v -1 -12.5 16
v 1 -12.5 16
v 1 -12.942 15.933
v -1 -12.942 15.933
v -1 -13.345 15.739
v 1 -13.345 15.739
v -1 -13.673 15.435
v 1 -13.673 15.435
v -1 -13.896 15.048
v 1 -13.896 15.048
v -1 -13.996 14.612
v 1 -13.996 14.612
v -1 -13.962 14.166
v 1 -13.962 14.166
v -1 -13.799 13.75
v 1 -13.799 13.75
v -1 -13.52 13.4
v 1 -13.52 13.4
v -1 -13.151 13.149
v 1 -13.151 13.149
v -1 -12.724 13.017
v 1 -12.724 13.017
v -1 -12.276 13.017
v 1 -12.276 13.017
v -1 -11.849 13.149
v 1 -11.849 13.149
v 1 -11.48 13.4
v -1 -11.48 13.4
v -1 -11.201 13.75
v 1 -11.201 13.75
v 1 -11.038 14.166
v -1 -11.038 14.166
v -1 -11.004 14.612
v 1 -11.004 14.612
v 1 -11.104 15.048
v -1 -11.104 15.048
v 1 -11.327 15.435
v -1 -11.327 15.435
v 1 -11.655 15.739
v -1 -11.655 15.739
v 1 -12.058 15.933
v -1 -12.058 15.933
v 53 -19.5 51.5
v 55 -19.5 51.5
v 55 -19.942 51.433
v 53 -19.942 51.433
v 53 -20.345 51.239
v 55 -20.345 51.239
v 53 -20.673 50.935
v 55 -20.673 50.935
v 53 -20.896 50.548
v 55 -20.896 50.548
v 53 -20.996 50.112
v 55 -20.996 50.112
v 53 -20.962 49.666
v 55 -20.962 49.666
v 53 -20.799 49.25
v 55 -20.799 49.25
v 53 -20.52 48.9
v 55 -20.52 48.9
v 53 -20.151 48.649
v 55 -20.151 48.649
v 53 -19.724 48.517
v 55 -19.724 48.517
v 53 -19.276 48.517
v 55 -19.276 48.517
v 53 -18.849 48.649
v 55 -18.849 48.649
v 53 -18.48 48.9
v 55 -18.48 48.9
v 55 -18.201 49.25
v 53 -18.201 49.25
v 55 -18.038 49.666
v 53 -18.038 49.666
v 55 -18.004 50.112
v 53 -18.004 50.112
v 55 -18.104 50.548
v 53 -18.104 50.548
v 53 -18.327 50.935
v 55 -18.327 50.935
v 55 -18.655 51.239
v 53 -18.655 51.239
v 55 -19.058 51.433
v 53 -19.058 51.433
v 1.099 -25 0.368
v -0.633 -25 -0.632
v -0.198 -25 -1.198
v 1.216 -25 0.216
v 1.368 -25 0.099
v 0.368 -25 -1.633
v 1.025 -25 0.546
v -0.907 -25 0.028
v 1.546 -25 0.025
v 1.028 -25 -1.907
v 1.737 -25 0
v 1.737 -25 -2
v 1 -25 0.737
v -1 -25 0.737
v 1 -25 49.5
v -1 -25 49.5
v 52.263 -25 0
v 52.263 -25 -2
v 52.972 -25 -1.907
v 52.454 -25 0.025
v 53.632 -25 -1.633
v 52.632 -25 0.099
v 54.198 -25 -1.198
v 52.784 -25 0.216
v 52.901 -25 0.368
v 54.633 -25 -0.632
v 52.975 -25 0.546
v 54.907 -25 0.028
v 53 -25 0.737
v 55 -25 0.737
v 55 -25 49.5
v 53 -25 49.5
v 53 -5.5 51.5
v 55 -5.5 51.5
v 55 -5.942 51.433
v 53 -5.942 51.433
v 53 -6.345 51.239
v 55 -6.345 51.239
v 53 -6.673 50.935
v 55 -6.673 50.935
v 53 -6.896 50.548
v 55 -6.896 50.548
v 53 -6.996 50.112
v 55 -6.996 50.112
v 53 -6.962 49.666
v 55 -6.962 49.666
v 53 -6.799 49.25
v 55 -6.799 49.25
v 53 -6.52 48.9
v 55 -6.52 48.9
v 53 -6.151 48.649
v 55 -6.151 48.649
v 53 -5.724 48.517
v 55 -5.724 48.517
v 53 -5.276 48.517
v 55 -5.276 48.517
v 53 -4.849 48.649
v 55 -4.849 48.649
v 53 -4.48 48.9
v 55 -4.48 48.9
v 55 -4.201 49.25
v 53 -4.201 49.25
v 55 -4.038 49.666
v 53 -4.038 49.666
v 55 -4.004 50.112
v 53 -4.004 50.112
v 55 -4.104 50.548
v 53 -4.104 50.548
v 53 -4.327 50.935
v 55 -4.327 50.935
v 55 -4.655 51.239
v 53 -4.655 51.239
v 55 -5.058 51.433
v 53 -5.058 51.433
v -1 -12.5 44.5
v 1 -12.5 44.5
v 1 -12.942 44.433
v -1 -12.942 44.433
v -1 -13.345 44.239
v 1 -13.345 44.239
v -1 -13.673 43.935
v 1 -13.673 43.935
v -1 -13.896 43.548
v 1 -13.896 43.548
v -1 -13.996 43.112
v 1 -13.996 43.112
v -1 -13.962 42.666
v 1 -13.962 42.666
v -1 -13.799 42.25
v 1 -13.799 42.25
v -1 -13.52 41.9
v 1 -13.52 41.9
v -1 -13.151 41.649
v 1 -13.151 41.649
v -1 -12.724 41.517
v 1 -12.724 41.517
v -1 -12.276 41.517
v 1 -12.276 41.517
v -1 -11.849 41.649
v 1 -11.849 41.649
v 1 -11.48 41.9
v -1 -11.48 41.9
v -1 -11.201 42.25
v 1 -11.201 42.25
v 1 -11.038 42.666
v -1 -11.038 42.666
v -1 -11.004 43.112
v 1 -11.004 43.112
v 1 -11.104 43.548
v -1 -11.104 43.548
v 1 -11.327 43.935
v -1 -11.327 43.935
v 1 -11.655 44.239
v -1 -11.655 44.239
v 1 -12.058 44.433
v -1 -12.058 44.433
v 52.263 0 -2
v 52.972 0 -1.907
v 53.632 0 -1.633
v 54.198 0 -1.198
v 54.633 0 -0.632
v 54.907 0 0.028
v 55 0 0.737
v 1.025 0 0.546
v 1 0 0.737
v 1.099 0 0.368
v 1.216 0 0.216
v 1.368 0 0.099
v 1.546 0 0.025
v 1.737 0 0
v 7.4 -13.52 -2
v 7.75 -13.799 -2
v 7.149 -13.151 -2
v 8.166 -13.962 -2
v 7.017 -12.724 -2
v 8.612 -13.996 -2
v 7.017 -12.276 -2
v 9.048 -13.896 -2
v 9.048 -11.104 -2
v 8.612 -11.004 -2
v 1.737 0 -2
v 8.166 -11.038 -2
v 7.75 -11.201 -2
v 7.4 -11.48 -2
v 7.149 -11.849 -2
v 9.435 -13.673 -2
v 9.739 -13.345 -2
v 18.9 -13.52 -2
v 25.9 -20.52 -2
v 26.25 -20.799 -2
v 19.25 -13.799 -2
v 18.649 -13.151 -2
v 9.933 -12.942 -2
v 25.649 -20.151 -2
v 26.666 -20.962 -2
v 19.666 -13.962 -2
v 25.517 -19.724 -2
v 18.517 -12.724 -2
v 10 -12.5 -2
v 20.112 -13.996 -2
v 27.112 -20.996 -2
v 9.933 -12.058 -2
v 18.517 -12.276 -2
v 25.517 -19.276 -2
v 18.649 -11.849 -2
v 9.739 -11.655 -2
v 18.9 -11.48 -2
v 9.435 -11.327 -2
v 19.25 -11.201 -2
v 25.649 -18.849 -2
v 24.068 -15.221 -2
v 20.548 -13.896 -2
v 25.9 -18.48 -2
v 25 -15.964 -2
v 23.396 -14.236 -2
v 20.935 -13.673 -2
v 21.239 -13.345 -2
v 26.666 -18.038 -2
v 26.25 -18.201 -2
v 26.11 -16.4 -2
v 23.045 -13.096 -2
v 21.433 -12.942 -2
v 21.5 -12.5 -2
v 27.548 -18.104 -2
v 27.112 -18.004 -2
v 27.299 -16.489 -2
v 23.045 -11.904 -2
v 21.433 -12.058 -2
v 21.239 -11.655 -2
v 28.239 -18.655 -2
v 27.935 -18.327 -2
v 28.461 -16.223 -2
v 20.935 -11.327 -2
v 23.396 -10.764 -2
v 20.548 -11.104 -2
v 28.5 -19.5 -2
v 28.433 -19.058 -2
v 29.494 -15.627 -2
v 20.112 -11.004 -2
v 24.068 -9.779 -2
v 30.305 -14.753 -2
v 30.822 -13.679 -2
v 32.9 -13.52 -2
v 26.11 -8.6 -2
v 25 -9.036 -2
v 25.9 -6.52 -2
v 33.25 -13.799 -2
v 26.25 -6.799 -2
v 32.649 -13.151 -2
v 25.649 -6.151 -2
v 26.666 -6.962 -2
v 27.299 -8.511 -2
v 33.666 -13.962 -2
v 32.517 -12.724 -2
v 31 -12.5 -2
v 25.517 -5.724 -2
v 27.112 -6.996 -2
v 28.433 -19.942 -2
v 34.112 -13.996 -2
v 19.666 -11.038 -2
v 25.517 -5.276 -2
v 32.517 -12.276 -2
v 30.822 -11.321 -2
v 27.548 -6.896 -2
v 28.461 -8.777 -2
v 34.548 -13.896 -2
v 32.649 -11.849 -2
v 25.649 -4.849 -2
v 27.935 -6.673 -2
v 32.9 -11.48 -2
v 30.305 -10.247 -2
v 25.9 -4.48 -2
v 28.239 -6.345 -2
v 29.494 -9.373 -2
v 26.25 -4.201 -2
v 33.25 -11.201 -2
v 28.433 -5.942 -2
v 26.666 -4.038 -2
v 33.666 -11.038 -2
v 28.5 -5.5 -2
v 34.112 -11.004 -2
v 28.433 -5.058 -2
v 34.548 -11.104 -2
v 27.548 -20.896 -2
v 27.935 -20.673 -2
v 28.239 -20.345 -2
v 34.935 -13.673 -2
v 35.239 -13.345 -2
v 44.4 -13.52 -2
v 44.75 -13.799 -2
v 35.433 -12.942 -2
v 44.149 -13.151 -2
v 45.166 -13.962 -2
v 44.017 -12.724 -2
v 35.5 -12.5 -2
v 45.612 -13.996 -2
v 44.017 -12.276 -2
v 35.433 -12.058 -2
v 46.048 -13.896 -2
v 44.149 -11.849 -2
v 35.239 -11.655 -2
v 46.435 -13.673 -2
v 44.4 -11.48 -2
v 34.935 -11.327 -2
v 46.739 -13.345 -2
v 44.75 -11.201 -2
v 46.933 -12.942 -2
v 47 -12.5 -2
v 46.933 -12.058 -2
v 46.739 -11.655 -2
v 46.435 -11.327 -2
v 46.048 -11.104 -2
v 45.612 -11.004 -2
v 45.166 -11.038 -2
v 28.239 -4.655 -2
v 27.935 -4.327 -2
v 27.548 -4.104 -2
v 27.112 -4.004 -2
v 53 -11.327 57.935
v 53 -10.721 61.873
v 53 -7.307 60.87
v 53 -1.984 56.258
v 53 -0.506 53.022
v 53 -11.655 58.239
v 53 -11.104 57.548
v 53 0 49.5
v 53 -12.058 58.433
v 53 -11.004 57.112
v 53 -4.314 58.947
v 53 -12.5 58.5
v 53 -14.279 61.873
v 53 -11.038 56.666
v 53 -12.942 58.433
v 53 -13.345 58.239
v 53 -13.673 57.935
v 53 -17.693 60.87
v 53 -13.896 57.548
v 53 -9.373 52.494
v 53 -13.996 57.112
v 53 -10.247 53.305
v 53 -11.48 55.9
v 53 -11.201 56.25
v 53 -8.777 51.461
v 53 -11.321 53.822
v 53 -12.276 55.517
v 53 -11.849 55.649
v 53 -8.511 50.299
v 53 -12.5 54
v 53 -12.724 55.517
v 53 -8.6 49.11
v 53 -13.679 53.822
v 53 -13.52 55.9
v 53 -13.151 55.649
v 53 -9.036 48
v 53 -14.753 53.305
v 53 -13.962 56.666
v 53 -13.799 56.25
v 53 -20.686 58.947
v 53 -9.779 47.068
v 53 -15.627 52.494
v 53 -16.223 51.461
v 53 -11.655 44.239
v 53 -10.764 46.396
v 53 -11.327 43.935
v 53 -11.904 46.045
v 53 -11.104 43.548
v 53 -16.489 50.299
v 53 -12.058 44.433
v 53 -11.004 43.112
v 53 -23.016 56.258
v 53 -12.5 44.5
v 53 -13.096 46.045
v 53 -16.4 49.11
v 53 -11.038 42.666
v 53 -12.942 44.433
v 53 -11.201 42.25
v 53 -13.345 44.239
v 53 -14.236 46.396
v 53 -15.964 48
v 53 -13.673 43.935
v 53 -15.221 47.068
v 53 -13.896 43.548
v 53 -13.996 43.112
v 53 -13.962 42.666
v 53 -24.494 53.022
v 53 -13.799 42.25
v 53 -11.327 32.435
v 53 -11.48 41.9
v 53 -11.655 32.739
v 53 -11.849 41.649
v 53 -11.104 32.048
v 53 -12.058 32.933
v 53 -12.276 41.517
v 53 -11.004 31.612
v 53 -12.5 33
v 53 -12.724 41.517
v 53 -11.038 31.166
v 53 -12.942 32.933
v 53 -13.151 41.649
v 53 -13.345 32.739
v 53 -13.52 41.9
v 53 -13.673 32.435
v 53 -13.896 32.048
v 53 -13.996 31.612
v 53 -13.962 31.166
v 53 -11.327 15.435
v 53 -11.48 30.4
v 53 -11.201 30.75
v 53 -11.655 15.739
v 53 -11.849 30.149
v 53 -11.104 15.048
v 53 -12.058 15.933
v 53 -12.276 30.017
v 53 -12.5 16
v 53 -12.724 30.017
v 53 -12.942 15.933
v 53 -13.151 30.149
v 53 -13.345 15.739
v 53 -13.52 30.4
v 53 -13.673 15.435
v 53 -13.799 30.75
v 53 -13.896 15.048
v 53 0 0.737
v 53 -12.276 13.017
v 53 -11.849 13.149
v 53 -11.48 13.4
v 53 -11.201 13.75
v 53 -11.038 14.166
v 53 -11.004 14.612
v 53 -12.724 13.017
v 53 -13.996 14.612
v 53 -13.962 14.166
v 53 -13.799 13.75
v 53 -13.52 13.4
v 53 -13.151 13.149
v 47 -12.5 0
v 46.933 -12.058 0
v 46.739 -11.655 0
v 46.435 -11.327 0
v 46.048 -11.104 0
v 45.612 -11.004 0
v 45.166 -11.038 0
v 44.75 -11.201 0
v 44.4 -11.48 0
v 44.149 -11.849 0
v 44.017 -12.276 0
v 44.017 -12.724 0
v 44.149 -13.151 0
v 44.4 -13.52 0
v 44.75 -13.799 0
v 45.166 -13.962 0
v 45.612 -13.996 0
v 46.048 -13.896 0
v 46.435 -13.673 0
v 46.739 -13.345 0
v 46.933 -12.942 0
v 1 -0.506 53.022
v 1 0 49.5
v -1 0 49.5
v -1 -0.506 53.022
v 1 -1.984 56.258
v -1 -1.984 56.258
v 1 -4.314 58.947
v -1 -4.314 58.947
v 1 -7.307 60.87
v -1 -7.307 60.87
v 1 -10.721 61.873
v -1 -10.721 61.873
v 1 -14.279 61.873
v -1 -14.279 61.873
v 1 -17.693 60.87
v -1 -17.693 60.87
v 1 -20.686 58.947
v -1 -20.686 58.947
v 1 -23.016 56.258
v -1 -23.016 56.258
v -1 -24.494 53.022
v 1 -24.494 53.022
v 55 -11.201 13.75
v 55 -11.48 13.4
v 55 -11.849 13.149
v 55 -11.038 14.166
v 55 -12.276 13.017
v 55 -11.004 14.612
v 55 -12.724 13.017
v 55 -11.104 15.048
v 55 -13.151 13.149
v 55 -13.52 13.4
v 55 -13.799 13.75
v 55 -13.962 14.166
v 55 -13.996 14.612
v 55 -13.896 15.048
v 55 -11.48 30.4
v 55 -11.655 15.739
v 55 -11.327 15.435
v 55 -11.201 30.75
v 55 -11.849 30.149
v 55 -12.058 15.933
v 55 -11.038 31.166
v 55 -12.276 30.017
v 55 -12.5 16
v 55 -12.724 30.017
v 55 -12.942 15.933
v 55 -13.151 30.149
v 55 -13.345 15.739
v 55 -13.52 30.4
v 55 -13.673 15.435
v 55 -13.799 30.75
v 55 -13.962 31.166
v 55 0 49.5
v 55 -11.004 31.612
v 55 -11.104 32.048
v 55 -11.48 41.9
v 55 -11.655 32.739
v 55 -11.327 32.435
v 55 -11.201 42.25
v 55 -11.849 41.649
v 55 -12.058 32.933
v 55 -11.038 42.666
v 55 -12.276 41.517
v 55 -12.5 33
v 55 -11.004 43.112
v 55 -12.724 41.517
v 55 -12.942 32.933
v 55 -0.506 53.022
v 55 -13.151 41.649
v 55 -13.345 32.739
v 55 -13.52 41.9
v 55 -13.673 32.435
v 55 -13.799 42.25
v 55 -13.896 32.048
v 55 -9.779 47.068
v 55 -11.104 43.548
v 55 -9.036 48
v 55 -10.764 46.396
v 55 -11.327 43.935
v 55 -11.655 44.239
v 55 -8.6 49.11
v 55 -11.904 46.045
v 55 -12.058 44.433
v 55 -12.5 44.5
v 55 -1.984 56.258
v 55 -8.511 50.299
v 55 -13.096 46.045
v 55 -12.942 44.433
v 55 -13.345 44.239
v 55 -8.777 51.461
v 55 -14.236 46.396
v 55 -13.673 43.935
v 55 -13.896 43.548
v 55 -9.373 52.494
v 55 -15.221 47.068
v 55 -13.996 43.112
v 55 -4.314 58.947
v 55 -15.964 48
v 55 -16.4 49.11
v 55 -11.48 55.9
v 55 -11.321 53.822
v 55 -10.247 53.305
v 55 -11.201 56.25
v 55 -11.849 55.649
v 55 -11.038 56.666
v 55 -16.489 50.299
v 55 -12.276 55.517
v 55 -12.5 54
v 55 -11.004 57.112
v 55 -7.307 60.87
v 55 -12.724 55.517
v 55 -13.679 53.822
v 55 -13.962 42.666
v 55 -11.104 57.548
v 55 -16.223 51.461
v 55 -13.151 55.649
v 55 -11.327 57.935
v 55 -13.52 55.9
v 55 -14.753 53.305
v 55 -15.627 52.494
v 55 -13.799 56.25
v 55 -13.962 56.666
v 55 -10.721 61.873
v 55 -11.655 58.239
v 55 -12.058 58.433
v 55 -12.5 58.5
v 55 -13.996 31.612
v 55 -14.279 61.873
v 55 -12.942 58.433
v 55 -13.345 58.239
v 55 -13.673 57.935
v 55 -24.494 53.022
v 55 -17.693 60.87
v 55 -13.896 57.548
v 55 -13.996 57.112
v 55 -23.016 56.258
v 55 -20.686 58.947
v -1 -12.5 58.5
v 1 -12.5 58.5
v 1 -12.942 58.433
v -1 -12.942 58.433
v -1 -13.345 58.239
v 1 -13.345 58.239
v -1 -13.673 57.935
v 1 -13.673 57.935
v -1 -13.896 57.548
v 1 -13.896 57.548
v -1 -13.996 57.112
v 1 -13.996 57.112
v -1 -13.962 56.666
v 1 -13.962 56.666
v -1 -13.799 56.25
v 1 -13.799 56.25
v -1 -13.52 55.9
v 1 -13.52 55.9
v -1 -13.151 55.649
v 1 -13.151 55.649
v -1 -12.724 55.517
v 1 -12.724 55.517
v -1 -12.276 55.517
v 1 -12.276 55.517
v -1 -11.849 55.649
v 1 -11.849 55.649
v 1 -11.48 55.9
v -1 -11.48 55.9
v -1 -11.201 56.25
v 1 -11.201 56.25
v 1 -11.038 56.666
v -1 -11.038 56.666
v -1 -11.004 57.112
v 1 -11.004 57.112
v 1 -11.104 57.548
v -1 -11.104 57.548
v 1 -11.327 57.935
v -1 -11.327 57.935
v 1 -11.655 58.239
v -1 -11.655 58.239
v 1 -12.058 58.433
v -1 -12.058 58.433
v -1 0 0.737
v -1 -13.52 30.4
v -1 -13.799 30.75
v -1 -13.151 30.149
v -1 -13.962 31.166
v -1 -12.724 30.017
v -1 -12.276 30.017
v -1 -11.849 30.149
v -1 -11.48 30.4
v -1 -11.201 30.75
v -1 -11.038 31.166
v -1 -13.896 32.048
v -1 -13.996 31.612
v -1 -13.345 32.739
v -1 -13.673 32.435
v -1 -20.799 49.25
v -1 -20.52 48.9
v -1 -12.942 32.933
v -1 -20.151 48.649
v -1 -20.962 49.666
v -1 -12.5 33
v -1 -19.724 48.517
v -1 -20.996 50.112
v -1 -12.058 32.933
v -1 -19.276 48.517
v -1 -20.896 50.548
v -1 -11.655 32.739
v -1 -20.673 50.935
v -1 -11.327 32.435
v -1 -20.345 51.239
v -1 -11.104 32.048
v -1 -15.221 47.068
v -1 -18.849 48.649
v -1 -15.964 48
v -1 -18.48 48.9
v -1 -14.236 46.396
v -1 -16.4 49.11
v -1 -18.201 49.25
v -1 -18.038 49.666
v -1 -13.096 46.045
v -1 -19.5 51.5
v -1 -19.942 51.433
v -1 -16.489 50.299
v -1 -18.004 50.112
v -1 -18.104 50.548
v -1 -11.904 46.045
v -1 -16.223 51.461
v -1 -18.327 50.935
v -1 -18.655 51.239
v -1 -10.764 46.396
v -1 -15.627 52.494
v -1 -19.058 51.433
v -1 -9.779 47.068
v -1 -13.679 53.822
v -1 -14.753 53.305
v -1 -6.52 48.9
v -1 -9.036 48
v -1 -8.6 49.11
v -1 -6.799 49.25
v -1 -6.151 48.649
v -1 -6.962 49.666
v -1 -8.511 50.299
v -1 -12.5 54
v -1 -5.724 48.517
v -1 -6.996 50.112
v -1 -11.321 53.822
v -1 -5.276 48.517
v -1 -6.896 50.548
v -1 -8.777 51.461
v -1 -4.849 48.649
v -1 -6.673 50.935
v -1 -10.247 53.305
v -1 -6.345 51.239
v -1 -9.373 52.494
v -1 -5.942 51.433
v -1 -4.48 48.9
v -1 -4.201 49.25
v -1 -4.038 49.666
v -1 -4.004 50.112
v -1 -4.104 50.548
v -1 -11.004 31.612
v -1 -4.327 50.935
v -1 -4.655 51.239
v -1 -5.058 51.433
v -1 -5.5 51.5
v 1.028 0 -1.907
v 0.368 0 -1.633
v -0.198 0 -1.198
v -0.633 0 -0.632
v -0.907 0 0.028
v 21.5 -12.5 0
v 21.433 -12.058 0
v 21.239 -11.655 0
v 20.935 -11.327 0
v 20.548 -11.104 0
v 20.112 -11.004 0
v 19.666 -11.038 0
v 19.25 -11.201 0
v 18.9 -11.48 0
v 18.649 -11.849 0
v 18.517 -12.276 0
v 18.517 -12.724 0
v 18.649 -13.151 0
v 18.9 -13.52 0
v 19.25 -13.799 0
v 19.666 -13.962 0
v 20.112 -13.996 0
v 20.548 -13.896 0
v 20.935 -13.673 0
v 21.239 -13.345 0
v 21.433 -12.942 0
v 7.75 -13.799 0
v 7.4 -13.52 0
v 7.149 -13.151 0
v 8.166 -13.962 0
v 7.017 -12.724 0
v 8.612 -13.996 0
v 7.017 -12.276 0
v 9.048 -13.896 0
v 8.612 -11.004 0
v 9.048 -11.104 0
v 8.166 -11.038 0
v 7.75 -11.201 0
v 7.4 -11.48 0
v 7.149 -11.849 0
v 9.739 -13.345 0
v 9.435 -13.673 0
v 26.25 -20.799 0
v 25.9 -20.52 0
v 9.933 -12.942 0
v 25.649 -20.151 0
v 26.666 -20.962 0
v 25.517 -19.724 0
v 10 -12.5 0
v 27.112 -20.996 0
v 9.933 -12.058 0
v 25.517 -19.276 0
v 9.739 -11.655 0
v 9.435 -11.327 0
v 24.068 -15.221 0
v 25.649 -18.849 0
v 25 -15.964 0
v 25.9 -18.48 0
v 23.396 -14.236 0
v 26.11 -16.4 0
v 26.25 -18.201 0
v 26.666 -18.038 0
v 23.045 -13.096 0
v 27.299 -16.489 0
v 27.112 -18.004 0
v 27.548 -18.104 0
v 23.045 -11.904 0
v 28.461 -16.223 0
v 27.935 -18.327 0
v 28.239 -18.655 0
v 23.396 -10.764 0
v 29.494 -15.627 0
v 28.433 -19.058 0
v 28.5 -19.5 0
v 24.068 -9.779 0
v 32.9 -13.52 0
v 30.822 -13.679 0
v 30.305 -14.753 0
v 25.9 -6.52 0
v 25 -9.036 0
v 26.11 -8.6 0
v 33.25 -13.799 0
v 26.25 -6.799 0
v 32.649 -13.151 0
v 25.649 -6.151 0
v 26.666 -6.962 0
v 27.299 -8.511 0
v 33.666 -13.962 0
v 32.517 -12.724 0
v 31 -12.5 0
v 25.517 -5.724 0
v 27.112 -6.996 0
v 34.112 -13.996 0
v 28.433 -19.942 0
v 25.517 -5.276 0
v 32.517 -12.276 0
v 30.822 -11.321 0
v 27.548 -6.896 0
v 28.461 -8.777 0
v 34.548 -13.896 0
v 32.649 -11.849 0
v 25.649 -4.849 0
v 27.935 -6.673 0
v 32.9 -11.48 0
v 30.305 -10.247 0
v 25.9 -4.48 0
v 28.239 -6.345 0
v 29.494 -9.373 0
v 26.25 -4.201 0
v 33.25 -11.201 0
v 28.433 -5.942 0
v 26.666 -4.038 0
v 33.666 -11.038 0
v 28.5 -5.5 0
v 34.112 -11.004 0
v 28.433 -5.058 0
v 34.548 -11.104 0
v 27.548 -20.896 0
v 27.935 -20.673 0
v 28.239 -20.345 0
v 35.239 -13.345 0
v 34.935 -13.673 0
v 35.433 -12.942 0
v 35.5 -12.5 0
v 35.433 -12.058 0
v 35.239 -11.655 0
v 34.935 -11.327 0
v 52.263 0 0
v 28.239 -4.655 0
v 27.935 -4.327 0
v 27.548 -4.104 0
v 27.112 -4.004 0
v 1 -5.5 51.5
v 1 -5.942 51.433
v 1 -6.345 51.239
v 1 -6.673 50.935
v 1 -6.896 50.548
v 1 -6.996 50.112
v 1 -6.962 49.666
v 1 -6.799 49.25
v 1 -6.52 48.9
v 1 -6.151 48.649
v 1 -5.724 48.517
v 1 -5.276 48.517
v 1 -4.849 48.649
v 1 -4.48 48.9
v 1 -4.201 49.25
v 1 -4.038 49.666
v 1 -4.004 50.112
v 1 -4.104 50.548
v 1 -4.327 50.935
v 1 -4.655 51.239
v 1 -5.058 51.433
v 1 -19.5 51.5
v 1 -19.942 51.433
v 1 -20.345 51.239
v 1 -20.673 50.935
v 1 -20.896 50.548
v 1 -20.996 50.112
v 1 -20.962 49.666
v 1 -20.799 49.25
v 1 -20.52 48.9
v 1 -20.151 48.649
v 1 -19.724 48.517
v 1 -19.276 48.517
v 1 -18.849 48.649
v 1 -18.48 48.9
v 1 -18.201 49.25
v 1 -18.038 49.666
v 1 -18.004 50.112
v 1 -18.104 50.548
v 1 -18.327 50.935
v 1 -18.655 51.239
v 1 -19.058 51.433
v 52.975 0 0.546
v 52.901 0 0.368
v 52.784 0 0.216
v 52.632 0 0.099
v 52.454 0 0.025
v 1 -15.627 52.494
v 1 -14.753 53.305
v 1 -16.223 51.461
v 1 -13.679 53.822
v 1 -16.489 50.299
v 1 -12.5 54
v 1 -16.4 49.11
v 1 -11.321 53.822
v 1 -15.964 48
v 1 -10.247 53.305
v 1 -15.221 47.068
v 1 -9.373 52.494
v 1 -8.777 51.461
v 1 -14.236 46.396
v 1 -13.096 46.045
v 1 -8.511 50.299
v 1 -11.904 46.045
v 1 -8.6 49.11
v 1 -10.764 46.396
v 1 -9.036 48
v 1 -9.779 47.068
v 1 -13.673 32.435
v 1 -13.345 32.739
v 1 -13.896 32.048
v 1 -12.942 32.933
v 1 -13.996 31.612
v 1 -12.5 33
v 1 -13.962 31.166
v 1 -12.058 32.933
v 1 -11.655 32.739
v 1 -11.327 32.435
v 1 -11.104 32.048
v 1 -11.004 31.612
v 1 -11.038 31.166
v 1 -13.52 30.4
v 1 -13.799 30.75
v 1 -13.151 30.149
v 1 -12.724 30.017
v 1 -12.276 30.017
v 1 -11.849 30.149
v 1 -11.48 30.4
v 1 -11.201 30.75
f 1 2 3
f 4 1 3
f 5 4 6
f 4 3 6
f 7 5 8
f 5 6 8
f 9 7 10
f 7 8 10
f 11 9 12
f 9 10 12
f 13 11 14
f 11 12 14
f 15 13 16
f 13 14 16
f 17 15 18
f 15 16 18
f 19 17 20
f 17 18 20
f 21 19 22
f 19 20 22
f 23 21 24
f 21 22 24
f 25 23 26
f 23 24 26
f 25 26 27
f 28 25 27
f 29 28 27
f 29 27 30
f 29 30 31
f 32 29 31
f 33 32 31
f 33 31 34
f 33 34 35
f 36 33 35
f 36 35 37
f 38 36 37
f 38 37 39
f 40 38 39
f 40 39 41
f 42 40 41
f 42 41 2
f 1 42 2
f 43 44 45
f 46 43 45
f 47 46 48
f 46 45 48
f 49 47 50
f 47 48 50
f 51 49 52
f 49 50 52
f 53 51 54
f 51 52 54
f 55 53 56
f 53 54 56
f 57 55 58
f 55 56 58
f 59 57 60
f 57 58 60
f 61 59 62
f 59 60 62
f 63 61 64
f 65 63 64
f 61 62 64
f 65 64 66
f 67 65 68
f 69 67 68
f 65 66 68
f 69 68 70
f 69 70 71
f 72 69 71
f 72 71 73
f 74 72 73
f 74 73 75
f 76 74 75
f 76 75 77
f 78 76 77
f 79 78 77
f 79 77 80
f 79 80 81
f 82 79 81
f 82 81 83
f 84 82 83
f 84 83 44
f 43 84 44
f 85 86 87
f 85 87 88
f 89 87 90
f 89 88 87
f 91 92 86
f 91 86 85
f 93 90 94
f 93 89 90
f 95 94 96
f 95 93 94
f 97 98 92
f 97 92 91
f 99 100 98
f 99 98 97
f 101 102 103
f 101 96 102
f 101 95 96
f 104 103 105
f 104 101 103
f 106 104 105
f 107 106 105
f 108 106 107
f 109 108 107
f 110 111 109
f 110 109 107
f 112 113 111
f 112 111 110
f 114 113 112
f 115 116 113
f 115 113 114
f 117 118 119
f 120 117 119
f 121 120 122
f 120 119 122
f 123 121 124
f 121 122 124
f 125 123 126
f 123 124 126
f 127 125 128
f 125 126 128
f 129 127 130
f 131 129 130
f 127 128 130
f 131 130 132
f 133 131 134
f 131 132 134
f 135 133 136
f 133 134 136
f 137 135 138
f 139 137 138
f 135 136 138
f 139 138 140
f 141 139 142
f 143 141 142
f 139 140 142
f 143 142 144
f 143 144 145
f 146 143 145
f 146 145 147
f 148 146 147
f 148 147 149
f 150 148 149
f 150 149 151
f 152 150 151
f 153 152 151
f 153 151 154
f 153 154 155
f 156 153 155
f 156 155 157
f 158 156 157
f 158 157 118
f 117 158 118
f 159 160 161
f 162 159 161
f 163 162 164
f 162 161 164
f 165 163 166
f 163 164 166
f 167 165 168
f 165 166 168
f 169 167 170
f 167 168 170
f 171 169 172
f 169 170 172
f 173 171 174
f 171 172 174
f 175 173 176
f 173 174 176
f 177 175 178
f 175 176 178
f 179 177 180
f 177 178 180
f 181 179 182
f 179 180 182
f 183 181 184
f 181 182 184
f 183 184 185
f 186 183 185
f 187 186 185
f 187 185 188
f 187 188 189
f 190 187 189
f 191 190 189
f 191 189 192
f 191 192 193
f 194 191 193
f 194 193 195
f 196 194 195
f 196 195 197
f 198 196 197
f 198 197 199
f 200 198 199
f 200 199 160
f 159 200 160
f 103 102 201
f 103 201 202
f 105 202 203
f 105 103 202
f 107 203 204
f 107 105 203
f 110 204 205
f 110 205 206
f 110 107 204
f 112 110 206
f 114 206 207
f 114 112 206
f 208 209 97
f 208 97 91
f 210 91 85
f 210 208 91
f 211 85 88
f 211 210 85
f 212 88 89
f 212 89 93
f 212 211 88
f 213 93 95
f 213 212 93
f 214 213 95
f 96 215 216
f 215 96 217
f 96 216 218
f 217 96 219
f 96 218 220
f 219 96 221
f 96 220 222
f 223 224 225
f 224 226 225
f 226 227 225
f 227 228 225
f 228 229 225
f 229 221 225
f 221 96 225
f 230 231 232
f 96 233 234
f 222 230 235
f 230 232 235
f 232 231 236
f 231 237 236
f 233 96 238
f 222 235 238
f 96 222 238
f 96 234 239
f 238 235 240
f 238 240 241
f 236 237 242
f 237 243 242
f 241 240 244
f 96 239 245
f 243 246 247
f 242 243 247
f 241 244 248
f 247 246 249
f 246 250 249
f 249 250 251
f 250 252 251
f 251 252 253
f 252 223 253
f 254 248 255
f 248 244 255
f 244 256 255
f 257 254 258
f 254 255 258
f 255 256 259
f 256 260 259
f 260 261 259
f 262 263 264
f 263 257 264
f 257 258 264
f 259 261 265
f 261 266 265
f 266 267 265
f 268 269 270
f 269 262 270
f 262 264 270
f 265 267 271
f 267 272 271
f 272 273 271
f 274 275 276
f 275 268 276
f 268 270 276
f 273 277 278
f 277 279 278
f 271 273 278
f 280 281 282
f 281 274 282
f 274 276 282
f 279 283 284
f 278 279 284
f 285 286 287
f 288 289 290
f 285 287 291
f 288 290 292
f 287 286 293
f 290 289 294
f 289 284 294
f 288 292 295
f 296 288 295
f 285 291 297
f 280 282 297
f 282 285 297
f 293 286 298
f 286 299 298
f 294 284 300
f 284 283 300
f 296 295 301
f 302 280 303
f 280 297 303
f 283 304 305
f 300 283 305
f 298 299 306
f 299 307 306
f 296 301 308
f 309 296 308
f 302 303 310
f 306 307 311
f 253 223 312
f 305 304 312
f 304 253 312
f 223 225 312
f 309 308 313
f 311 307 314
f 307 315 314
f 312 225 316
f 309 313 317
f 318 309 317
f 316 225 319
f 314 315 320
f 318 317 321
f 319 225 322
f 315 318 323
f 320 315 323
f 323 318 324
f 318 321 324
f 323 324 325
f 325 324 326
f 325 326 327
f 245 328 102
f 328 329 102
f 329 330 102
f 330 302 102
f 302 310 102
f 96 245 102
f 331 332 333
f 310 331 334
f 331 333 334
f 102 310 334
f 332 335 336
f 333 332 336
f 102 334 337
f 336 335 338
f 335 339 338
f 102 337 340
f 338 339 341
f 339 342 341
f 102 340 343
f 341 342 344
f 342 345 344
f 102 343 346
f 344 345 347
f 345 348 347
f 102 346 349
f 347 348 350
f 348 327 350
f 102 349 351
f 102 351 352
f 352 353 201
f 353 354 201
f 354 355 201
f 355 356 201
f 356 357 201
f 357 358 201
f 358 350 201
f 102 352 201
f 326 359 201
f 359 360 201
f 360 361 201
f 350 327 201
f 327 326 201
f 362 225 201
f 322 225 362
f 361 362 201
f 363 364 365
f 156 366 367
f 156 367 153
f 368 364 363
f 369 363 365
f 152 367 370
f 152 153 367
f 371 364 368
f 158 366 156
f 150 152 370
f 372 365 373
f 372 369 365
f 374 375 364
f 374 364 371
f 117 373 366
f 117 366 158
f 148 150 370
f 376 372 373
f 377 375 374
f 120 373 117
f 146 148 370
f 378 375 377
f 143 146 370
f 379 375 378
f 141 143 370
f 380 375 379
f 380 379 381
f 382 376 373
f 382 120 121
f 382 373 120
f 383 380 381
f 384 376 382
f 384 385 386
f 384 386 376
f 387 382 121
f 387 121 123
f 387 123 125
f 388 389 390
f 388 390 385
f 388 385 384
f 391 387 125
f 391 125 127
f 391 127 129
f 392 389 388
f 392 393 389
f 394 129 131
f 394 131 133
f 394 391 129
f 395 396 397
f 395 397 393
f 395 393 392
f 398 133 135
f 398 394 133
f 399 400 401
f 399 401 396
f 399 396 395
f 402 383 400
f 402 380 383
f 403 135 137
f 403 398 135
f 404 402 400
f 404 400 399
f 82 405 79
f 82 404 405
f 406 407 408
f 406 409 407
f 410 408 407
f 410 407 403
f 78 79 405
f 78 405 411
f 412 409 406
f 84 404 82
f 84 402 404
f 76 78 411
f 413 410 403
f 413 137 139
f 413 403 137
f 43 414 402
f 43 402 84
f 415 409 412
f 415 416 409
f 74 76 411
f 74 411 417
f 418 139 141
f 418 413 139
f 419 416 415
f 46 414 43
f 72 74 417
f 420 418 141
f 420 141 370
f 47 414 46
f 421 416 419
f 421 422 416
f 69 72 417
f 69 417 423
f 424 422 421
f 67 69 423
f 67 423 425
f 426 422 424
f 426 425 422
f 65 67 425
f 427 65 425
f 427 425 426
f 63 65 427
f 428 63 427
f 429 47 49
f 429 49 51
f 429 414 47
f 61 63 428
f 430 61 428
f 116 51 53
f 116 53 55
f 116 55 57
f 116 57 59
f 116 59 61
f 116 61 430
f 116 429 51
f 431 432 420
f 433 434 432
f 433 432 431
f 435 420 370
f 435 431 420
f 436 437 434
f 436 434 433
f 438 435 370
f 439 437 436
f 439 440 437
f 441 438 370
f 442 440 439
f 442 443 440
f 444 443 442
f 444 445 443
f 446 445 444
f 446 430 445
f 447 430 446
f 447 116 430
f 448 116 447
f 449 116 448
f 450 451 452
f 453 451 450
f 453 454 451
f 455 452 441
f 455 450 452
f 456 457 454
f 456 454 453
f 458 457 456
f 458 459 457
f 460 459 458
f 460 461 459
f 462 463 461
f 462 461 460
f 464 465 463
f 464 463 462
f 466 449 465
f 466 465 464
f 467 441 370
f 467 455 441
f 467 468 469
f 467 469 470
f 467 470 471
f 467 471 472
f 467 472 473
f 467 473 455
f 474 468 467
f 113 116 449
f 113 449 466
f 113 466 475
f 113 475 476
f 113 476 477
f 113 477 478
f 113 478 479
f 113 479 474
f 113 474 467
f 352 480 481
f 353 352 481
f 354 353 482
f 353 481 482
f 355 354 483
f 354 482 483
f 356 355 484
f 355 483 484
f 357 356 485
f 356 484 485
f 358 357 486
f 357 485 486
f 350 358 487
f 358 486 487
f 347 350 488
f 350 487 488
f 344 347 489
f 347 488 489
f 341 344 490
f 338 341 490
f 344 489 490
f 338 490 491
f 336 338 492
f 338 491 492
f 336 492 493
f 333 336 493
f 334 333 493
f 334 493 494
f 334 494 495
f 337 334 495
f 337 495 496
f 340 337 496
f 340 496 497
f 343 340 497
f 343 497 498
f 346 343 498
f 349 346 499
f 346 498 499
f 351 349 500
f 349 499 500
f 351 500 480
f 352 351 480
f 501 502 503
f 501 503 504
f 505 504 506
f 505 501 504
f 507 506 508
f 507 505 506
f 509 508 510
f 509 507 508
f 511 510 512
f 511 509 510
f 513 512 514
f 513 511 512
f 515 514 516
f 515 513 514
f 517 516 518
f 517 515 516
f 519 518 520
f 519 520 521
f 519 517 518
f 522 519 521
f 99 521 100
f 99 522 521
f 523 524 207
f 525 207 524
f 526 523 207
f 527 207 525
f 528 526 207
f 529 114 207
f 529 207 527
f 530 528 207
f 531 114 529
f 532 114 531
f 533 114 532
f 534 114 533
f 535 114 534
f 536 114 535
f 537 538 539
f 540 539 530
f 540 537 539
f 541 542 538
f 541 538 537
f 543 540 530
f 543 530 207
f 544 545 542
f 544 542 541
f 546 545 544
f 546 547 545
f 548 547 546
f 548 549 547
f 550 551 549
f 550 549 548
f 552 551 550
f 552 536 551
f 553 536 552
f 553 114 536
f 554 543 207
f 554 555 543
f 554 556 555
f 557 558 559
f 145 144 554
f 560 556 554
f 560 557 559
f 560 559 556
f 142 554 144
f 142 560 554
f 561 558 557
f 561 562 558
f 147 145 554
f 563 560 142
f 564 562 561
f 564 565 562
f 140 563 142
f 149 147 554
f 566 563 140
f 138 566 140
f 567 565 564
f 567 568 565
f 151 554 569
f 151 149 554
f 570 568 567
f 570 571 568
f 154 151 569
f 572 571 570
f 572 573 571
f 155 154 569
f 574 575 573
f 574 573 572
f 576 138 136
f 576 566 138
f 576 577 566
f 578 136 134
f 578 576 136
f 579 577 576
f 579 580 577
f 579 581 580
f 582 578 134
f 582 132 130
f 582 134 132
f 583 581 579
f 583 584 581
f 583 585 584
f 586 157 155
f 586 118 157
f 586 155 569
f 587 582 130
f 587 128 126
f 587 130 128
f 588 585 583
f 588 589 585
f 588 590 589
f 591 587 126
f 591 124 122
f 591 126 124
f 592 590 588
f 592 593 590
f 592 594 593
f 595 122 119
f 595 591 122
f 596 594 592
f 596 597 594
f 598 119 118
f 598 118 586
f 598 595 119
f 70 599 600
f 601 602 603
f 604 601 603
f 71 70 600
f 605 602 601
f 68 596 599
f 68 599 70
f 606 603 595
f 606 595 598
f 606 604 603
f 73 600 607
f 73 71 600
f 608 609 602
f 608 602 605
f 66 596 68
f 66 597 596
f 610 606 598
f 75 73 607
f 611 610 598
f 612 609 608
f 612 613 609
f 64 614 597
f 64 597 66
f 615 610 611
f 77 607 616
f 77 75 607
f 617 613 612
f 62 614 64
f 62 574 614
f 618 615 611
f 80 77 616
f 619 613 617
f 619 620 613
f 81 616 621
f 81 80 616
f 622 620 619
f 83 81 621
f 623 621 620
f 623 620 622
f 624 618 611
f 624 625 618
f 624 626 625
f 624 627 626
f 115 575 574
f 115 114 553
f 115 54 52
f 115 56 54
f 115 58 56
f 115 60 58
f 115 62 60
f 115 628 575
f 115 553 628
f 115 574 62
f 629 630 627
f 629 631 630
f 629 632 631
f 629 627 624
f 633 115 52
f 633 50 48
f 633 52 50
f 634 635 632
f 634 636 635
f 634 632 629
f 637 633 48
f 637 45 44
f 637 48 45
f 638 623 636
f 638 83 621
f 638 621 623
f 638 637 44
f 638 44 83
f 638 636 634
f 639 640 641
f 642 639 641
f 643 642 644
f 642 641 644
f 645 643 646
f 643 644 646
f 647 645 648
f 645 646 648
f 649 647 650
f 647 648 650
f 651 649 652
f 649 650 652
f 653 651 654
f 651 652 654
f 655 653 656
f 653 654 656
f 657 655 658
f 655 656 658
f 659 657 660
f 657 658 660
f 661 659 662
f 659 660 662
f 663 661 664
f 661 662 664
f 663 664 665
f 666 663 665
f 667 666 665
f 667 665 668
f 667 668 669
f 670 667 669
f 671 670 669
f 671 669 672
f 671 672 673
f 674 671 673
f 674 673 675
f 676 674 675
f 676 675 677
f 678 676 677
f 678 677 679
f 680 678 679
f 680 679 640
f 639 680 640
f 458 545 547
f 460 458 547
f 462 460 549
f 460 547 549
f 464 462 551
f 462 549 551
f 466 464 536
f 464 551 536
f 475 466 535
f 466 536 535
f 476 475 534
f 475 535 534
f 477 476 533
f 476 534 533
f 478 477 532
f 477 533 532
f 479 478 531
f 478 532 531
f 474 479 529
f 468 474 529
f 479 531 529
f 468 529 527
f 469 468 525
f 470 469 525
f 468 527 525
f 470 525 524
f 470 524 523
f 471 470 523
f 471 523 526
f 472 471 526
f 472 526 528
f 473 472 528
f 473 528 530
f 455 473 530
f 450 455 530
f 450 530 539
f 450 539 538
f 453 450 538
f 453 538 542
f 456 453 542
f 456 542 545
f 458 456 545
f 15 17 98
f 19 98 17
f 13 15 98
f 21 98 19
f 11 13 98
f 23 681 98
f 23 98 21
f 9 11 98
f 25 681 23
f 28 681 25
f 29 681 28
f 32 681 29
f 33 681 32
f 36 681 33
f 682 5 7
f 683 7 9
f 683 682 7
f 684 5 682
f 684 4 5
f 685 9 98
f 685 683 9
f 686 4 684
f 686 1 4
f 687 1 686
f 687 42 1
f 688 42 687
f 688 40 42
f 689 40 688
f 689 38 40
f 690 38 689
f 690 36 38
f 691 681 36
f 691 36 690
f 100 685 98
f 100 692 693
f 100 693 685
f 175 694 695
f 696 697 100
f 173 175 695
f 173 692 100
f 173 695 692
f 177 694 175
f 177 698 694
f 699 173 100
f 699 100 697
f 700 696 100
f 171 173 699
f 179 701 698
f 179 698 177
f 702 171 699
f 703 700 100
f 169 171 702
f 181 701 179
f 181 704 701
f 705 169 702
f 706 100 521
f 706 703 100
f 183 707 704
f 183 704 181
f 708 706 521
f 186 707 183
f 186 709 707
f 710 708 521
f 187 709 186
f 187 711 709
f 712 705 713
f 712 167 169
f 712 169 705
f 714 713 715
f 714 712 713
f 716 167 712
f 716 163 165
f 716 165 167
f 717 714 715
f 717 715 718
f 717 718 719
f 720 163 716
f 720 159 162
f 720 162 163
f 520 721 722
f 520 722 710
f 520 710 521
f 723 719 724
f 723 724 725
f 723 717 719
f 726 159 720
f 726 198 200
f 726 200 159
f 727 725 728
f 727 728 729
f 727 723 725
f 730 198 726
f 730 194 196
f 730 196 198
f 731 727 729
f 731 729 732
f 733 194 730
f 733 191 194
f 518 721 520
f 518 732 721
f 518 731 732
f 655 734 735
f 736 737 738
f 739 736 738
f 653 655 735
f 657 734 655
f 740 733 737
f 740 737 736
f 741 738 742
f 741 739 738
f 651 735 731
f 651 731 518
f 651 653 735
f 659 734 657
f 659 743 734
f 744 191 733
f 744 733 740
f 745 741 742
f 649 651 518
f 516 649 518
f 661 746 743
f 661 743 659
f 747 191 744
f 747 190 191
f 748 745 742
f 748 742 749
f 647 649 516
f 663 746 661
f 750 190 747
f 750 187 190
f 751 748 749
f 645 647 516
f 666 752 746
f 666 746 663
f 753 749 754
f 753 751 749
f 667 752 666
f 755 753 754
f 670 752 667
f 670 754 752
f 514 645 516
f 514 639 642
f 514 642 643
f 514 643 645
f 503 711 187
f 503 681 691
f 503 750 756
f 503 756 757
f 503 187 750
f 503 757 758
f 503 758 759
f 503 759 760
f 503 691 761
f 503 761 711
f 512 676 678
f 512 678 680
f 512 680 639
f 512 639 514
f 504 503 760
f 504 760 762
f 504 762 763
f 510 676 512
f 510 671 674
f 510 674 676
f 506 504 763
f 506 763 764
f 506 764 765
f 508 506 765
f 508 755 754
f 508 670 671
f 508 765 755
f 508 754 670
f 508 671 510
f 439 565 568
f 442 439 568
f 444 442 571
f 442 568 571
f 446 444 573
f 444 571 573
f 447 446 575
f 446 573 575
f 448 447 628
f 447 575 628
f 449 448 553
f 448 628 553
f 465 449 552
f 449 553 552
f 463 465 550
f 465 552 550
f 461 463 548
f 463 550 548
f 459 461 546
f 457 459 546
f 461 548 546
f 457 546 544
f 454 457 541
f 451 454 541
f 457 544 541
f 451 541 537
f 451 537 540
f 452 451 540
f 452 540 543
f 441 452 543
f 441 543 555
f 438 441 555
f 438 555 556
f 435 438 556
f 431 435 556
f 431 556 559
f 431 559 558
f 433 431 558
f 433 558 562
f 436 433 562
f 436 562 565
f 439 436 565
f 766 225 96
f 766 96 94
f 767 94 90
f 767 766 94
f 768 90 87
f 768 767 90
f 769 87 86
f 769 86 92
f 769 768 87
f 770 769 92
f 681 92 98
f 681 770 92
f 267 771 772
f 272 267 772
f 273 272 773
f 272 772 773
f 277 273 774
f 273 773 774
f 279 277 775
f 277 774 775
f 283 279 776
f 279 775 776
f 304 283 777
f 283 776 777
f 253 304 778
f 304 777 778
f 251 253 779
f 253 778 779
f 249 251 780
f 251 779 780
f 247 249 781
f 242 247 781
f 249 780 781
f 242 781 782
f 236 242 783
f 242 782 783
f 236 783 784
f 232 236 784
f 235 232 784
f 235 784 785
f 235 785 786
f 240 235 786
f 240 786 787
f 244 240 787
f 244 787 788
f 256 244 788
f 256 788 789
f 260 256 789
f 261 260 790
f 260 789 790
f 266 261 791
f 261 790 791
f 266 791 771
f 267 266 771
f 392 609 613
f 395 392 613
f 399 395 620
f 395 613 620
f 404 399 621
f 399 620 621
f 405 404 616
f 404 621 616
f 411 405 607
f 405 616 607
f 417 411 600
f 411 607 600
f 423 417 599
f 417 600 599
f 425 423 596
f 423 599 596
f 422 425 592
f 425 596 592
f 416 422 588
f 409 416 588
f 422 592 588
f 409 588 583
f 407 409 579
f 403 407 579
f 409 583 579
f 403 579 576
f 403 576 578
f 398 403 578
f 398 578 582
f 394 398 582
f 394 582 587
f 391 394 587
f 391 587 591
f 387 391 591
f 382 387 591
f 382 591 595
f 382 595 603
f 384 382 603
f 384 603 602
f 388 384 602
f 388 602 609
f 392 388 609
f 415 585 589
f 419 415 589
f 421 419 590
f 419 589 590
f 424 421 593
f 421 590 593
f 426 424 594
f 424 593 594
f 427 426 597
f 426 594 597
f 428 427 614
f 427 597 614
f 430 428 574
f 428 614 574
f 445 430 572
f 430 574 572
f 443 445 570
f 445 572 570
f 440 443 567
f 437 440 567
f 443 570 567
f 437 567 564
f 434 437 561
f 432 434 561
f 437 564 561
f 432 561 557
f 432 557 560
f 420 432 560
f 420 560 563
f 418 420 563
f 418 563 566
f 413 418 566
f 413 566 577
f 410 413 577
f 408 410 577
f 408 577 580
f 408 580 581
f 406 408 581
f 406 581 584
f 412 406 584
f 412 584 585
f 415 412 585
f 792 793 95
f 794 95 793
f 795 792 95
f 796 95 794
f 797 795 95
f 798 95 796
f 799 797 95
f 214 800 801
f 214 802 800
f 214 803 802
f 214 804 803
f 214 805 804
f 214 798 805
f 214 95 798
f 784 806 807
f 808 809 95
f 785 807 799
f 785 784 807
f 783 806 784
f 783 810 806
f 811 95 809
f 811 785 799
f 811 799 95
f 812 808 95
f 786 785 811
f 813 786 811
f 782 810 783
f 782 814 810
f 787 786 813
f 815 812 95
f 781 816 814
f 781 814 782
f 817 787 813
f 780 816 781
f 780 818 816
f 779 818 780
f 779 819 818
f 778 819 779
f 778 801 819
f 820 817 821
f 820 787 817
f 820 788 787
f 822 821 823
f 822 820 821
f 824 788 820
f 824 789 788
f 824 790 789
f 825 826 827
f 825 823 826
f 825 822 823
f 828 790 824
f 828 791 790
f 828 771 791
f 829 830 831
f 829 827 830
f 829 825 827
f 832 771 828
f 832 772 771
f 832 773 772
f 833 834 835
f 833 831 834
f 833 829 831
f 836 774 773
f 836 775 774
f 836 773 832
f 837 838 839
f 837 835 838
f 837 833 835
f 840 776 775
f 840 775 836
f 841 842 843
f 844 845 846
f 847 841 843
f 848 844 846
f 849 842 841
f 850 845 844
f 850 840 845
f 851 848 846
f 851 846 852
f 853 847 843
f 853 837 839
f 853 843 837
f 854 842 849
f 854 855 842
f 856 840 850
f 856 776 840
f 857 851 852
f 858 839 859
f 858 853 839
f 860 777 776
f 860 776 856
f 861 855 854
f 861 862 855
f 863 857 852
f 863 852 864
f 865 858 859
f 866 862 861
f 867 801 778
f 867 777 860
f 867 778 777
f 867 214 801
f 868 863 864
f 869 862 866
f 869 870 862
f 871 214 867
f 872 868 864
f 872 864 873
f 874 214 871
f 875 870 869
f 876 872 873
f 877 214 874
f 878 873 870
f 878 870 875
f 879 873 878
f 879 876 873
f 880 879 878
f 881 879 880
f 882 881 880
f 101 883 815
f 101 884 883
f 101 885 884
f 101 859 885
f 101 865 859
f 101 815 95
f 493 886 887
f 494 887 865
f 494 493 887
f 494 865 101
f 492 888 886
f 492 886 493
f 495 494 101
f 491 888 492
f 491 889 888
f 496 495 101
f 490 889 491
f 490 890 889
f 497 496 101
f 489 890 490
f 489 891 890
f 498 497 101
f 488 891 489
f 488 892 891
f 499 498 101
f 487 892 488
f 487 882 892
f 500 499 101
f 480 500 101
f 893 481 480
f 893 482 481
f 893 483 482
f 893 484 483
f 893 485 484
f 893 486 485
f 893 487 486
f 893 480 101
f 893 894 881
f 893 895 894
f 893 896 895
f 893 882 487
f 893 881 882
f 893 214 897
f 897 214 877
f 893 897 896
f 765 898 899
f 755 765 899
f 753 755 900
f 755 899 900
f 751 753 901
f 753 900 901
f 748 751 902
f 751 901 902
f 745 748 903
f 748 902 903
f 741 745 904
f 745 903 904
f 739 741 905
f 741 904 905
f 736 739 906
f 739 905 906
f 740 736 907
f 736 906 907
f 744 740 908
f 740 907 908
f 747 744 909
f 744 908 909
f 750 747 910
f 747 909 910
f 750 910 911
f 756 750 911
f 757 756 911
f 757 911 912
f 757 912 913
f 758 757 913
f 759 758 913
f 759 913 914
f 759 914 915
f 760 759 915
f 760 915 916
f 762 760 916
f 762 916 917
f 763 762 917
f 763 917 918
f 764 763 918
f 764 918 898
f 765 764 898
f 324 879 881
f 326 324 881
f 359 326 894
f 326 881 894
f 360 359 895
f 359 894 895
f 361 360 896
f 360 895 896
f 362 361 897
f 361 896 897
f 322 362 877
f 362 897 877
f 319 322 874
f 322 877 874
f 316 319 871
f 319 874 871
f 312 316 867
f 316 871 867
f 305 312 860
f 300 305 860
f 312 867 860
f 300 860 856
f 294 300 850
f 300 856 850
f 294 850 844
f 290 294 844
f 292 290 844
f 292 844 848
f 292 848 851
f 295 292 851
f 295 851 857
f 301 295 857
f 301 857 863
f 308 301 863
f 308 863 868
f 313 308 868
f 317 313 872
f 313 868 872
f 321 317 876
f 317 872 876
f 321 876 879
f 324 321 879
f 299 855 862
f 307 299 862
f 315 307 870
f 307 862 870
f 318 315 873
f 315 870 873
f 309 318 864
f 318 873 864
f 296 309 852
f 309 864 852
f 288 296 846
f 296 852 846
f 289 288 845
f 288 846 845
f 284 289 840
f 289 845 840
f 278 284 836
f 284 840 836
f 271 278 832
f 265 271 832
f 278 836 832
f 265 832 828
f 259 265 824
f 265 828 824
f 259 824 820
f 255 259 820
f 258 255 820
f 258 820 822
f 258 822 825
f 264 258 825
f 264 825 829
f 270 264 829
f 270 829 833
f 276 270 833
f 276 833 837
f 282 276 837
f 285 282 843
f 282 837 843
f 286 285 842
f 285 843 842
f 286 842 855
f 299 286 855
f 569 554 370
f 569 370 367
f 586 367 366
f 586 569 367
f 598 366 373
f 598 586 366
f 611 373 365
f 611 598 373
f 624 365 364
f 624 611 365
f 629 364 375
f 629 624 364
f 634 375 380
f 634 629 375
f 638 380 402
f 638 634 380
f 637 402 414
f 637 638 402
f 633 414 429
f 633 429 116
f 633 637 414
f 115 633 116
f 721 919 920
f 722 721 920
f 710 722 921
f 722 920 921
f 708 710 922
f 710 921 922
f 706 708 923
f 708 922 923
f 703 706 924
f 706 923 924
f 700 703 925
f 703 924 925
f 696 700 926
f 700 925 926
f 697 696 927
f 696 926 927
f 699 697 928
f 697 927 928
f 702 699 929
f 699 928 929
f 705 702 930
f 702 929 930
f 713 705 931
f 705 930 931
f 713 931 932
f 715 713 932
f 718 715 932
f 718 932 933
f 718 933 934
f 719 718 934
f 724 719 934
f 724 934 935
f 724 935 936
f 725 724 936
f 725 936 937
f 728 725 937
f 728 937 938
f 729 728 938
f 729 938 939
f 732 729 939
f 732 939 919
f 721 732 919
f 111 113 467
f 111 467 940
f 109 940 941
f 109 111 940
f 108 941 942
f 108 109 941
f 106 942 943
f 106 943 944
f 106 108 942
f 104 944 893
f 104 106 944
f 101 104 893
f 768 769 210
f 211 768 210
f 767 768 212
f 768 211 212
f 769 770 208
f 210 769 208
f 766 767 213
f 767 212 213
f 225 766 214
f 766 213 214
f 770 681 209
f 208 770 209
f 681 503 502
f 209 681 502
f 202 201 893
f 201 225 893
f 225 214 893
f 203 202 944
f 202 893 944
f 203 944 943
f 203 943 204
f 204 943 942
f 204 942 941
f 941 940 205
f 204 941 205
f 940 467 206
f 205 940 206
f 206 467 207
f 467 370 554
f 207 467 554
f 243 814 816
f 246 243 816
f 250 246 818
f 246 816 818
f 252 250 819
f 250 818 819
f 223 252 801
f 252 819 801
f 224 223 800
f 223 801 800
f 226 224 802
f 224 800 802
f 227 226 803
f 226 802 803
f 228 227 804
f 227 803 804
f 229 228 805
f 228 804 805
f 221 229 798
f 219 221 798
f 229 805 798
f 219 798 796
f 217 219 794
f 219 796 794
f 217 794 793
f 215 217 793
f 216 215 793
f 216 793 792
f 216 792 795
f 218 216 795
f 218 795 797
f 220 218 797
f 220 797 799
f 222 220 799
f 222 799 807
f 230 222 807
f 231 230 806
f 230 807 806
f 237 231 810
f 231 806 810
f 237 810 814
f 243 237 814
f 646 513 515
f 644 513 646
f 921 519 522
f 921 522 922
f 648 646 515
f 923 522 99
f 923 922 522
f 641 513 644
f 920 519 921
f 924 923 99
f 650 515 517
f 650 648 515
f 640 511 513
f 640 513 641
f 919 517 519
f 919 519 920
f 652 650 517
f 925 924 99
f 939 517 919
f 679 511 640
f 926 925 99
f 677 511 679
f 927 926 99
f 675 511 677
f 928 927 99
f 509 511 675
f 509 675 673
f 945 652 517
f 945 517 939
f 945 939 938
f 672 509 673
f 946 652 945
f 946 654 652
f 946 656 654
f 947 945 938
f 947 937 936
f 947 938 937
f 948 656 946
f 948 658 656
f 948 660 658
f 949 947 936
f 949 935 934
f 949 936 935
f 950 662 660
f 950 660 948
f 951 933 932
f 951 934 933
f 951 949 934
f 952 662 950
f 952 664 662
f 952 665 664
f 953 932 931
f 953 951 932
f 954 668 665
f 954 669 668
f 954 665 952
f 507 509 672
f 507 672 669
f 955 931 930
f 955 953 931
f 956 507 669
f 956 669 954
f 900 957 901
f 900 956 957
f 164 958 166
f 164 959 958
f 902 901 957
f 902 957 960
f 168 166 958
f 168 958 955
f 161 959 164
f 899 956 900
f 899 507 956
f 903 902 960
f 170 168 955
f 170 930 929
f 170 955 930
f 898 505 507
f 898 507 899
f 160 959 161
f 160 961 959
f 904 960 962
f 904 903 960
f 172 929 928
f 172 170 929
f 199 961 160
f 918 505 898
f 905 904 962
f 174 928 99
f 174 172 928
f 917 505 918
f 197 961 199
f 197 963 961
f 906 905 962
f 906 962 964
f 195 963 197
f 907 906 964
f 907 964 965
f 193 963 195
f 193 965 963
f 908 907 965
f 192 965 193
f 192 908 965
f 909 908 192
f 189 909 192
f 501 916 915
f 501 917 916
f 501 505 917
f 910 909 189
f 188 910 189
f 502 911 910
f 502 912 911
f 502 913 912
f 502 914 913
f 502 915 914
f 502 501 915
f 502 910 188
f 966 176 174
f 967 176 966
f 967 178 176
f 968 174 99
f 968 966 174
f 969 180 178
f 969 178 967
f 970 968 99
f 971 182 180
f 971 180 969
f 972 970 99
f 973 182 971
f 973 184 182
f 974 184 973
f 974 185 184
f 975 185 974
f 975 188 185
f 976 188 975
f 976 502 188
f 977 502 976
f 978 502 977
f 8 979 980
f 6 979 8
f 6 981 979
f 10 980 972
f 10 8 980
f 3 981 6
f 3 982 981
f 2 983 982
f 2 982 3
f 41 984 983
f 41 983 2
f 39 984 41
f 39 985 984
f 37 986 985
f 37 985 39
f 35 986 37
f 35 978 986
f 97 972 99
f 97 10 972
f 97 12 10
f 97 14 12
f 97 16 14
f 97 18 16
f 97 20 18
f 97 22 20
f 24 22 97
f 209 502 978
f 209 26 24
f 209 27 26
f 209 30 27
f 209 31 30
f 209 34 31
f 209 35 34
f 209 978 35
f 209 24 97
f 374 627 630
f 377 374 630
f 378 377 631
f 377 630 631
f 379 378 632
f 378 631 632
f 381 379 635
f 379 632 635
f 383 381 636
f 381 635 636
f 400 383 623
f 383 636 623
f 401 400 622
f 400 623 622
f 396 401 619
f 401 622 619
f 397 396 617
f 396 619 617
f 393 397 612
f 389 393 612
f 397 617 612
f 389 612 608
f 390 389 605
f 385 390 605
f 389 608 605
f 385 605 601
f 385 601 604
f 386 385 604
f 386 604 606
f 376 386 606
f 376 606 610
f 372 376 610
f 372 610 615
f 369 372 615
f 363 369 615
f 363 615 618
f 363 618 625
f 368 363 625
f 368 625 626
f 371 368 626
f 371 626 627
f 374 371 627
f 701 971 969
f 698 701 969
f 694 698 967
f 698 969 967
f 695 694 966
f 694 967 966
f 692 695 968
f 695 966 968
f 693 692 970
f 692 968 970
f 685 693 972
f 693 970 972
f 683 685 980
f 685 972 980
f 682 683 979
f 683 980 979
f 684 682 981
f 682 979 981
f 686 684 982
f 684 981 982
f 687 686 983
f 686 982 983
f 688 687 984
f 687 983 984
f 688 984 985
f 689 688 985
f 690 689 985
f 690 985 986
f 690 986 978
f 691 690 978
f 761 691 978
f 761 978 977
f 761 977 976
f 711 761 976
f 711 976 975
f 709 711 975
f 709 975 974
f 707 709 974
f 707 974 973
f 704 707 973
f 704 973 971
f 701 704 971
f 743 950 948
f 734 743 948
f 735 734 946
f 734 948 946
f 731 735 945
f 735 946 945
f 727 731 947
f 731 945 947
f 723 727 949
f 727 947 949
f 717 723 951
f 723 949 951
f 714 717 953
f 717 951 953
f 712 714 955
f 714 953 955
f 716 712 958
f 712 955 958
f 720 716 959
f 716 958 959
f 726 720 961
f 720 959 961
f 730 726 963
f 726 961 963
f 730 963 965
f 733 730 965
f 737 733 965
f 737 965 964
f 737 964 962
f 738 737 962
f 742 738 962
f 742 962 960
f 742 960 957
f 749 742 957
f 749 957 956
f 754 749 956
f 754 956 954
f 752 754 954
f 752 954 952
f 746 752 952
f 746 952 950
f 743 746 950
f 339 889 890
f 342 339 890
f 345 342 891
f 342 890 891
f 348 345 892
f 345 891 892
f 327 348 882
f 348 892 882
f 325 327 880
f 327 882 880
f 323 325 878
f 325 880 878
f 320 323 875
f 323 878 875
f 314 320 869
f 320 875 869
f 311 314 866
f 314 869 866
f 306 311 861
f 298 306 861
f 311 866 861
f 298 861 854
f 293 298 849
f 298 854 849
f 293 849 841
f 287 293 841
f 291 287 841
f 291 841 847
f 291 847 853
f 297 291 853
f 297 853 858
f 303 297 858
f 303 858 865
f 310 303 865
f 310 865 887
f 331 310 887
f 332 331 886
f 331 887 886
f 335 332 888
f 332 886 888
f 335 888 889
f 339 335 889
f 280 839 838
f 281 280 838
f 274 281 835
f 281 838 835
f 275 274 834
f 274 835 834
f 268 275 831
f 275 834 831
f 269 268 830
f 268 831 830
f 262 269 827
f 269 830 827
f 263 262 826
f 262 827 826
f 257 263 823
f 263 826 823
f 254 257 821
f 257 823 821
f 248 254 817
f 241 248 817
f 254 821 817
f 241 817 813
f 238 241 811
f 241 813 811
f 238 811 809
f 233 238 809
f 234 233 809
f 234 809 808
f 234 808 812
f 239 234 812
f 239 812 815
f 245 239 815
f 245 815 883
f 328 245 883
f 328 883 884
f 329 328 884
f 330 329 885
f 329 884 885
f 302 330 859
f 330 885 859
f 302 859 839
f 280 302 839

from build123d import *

# Parameters (mm, degrees)
SKETCH_1_W                         = 54
SKETCH_1_H                         = 25
SKETCH_1_R                         = 4
SKETCH_1_R_2                       = 1.5
SM_BASE_FLANGE_1_DEPTH             = 2
SM_EDGE_FLANGE_1_STRIP_W           = 10.4732
SM_EDGE_FLANGE_1_STRIP_H           = 2
SM_EDGE_FLANGE_1_STRIP_CUT_DEPTH   = 25
SM_EDGE_FLANGE_1_STRIP_2_W         = 10.4732
SM_EDGE_FLANGE_1_STRIP_2_H         = 2
SM_EDGE_FLANGE_1_STRIP_CUT_2_DEPTH = 25
SM_EDGE_FLANGE_1_DEPTH             = 25
SM_EDGE_FLANGE_1_BEND_DEPTH        = 25
SKETCH_12_R                        = 4
SKETCH_12_R_2                      = 1.5
CUT_EXTRUDE_1_DEPTH                = 72


# Sheet-metal steps are written as plain solids
with BuildPart() as part:
    # Sketch 1 → 基体-法兰1 (new body)
    with BuildSketch(Plane.XY):
        with Locations((27, -12.5)):
            Rectangle(SKETCH_1_W, SKETCH_1_H)
        with Locations((27, -12.5)):
            Circle(SKETCH_1_R, mode=Mode.SUBTRACT)
        with Locations((27, -5.5)):
            Circle(SKETCH_1_R_2, mode=Mode.SUBTRACT)
        with Locations((27, -19.5)):
            Circle(SKETCH_1_R_2, mode=Mode.SUBTRACT)
        with Locations((34, -12.5)):
            Circle(SKETCH_1_R_2, mode=Mode.SUBTRACT)
        with Locations((20, -12.5)):
            Circle(SKETCH_1_R_2, mode=Mode.SUBTRACT)
        with Locations((45.5, -12.5)):
            Circle(SKETCH_1_R_2, mode=Mode.SUBTRACT)
        with Locations((8.5, -12.5)):
            Circle(SKETCH_1_R_2, mode=Mode.SUBTRACT)
    extrude(amount=-SM_BASE_FLANGE_1_DEPTH)

    # 边线-法兰1 strip (across the edge) → 边线-法兰1 strip cut (cut)
    with BuildSketch(Plane(origin=(-1, 0, 0), x_dir=(1, 0, 0), z_dir=(0, -1, 0))):
        with Locations((-2.5, -1)):
            Rectangle(SM_EDGE_FLANGE_1_STRIP_W, SM_EDGE_FLANGE_1_STRIP_H)
    extrude(amount=SM_EDGE_FLANGE_1_STRIP_CUT_DEPTH, mode=Mode.SUBTRACT)

    # 边线-法兰1 strip 2 (across the edge) → 边线-法兰1 strip cut 2 (cut)
    with BuildSketch(Plane(origin=(55, -25, 0), x_dir=(-1, 0, 0), z_dir=(0, 1, 0))):
        with Locations((-2.5, -1)):
            Rectangle(SM_EDGE_FLANGE_1_STRIP_2_W, SM_EDGE_FLANGE_1_STRIP_2_H)
    extrude(amount=SM_EDGE_FLANGE_1_STRIP_CUT_2_DEPTH, mode=Mode.SUBTRACT)

    # 边线-法兰1 section (across the edge) → 边线-法兰1 (add)
    with BuildSketch(Plane(origin=(-1, 0, 0), x_dir=(1, 0, 0), z_dir=(0, -1, 0))):
        with BuildLine():
            Line((0, 0.7366), (0, 68))
            Line((0, 68), (2, 68))
            Line((2, 68), (2, 0.7366))
            ThreePointArc((2, 0.7366), (2.215745145, 0.215745145), (2.7366, 0))
            Line((2.7366, 0), (2.7366, -2))
            ThreePointArc((2.7366, -2), (0.801531583, -1.198468417), (0, 0.7366))
        make_face()
    extrude(amount=SM_EDGE_FLANGE_1_DEPTH)

    # 边线-法兰1 section 2 (across the edge) → 边线-法兰1 bend (add)
    with BuildSketch(Plane(origin=(55, -25, 0), x_dir=(-1, 0, 0), z_dir=(0, 1, 0))):
        with BuildLine():
            Line((0, 0.7366), (0, 68))
            Line((0, 68), (2, 68))
            Line((2, 68), (2, 0.7366))
            ThreePointArc((2, 0.7366), (2.215745145, 0.215745145), (2.7366, 0))
            Line((2.7366, 0), (2.7366, -2))
            ThreePointArc((2.7366, -2), (0.801531583, -1.198468417), (0, 0.7366))
        make_face()
    extrude(amount=SM_EDGE_FLANGE_1_BEND_DEPTH)

    # 草图12 → 切除-拉伸1 (cut)
    with BuildSketch(Plane(origin=(55, 0, 0), x_dir=(0, 0, -1), z_dir=(1, 0, 0))):
        with Locations(Location((-50, -12.5, 0), (0, 0, 180))):
            Circle(SKETCH_12_R)
        with Locations(Location((-57, -12.5, 0), (0, 0, 180))):
            Circle(SKETCH_12_R_2)
        with Locations(Location((-50, -5.5, 0), (0, 0, 180))):
            Circle(SKETCH_12_R_2)
        with Locations(Location((-43, -12.5, 0), (0, 0, 180))):
            Circle(SKETCH_12_R_2)
        with Locations(Location((-50, -19.5, 0), (0, 0, 180))):
            Circle(SKETCH_12_R_2)
        with Locations(Location((-31.5, -12.5, 0), (0, 0, 180))):
            Circle(SKETCH_12_R_2)
        with Locations(Location((-14.5, -12.5, 0), (0, 0, 180))):
            Circle(SKETCH_12_R_2)
        with BuildLine():
            Line((-49.5, -25), (-68, -25))
            Line((-68, -25), (-68, 0))
            Line((-68, 0), (-49.5, 0))
            ThreePointArc((-49.5, 0), (-62, -12.5), (-49.5, -25))
        make_face()
    extrude(amount=-CUT_EXTRUDE_1_DEPTH, mode=Mode.SUBTRACT)


solid = part.part
